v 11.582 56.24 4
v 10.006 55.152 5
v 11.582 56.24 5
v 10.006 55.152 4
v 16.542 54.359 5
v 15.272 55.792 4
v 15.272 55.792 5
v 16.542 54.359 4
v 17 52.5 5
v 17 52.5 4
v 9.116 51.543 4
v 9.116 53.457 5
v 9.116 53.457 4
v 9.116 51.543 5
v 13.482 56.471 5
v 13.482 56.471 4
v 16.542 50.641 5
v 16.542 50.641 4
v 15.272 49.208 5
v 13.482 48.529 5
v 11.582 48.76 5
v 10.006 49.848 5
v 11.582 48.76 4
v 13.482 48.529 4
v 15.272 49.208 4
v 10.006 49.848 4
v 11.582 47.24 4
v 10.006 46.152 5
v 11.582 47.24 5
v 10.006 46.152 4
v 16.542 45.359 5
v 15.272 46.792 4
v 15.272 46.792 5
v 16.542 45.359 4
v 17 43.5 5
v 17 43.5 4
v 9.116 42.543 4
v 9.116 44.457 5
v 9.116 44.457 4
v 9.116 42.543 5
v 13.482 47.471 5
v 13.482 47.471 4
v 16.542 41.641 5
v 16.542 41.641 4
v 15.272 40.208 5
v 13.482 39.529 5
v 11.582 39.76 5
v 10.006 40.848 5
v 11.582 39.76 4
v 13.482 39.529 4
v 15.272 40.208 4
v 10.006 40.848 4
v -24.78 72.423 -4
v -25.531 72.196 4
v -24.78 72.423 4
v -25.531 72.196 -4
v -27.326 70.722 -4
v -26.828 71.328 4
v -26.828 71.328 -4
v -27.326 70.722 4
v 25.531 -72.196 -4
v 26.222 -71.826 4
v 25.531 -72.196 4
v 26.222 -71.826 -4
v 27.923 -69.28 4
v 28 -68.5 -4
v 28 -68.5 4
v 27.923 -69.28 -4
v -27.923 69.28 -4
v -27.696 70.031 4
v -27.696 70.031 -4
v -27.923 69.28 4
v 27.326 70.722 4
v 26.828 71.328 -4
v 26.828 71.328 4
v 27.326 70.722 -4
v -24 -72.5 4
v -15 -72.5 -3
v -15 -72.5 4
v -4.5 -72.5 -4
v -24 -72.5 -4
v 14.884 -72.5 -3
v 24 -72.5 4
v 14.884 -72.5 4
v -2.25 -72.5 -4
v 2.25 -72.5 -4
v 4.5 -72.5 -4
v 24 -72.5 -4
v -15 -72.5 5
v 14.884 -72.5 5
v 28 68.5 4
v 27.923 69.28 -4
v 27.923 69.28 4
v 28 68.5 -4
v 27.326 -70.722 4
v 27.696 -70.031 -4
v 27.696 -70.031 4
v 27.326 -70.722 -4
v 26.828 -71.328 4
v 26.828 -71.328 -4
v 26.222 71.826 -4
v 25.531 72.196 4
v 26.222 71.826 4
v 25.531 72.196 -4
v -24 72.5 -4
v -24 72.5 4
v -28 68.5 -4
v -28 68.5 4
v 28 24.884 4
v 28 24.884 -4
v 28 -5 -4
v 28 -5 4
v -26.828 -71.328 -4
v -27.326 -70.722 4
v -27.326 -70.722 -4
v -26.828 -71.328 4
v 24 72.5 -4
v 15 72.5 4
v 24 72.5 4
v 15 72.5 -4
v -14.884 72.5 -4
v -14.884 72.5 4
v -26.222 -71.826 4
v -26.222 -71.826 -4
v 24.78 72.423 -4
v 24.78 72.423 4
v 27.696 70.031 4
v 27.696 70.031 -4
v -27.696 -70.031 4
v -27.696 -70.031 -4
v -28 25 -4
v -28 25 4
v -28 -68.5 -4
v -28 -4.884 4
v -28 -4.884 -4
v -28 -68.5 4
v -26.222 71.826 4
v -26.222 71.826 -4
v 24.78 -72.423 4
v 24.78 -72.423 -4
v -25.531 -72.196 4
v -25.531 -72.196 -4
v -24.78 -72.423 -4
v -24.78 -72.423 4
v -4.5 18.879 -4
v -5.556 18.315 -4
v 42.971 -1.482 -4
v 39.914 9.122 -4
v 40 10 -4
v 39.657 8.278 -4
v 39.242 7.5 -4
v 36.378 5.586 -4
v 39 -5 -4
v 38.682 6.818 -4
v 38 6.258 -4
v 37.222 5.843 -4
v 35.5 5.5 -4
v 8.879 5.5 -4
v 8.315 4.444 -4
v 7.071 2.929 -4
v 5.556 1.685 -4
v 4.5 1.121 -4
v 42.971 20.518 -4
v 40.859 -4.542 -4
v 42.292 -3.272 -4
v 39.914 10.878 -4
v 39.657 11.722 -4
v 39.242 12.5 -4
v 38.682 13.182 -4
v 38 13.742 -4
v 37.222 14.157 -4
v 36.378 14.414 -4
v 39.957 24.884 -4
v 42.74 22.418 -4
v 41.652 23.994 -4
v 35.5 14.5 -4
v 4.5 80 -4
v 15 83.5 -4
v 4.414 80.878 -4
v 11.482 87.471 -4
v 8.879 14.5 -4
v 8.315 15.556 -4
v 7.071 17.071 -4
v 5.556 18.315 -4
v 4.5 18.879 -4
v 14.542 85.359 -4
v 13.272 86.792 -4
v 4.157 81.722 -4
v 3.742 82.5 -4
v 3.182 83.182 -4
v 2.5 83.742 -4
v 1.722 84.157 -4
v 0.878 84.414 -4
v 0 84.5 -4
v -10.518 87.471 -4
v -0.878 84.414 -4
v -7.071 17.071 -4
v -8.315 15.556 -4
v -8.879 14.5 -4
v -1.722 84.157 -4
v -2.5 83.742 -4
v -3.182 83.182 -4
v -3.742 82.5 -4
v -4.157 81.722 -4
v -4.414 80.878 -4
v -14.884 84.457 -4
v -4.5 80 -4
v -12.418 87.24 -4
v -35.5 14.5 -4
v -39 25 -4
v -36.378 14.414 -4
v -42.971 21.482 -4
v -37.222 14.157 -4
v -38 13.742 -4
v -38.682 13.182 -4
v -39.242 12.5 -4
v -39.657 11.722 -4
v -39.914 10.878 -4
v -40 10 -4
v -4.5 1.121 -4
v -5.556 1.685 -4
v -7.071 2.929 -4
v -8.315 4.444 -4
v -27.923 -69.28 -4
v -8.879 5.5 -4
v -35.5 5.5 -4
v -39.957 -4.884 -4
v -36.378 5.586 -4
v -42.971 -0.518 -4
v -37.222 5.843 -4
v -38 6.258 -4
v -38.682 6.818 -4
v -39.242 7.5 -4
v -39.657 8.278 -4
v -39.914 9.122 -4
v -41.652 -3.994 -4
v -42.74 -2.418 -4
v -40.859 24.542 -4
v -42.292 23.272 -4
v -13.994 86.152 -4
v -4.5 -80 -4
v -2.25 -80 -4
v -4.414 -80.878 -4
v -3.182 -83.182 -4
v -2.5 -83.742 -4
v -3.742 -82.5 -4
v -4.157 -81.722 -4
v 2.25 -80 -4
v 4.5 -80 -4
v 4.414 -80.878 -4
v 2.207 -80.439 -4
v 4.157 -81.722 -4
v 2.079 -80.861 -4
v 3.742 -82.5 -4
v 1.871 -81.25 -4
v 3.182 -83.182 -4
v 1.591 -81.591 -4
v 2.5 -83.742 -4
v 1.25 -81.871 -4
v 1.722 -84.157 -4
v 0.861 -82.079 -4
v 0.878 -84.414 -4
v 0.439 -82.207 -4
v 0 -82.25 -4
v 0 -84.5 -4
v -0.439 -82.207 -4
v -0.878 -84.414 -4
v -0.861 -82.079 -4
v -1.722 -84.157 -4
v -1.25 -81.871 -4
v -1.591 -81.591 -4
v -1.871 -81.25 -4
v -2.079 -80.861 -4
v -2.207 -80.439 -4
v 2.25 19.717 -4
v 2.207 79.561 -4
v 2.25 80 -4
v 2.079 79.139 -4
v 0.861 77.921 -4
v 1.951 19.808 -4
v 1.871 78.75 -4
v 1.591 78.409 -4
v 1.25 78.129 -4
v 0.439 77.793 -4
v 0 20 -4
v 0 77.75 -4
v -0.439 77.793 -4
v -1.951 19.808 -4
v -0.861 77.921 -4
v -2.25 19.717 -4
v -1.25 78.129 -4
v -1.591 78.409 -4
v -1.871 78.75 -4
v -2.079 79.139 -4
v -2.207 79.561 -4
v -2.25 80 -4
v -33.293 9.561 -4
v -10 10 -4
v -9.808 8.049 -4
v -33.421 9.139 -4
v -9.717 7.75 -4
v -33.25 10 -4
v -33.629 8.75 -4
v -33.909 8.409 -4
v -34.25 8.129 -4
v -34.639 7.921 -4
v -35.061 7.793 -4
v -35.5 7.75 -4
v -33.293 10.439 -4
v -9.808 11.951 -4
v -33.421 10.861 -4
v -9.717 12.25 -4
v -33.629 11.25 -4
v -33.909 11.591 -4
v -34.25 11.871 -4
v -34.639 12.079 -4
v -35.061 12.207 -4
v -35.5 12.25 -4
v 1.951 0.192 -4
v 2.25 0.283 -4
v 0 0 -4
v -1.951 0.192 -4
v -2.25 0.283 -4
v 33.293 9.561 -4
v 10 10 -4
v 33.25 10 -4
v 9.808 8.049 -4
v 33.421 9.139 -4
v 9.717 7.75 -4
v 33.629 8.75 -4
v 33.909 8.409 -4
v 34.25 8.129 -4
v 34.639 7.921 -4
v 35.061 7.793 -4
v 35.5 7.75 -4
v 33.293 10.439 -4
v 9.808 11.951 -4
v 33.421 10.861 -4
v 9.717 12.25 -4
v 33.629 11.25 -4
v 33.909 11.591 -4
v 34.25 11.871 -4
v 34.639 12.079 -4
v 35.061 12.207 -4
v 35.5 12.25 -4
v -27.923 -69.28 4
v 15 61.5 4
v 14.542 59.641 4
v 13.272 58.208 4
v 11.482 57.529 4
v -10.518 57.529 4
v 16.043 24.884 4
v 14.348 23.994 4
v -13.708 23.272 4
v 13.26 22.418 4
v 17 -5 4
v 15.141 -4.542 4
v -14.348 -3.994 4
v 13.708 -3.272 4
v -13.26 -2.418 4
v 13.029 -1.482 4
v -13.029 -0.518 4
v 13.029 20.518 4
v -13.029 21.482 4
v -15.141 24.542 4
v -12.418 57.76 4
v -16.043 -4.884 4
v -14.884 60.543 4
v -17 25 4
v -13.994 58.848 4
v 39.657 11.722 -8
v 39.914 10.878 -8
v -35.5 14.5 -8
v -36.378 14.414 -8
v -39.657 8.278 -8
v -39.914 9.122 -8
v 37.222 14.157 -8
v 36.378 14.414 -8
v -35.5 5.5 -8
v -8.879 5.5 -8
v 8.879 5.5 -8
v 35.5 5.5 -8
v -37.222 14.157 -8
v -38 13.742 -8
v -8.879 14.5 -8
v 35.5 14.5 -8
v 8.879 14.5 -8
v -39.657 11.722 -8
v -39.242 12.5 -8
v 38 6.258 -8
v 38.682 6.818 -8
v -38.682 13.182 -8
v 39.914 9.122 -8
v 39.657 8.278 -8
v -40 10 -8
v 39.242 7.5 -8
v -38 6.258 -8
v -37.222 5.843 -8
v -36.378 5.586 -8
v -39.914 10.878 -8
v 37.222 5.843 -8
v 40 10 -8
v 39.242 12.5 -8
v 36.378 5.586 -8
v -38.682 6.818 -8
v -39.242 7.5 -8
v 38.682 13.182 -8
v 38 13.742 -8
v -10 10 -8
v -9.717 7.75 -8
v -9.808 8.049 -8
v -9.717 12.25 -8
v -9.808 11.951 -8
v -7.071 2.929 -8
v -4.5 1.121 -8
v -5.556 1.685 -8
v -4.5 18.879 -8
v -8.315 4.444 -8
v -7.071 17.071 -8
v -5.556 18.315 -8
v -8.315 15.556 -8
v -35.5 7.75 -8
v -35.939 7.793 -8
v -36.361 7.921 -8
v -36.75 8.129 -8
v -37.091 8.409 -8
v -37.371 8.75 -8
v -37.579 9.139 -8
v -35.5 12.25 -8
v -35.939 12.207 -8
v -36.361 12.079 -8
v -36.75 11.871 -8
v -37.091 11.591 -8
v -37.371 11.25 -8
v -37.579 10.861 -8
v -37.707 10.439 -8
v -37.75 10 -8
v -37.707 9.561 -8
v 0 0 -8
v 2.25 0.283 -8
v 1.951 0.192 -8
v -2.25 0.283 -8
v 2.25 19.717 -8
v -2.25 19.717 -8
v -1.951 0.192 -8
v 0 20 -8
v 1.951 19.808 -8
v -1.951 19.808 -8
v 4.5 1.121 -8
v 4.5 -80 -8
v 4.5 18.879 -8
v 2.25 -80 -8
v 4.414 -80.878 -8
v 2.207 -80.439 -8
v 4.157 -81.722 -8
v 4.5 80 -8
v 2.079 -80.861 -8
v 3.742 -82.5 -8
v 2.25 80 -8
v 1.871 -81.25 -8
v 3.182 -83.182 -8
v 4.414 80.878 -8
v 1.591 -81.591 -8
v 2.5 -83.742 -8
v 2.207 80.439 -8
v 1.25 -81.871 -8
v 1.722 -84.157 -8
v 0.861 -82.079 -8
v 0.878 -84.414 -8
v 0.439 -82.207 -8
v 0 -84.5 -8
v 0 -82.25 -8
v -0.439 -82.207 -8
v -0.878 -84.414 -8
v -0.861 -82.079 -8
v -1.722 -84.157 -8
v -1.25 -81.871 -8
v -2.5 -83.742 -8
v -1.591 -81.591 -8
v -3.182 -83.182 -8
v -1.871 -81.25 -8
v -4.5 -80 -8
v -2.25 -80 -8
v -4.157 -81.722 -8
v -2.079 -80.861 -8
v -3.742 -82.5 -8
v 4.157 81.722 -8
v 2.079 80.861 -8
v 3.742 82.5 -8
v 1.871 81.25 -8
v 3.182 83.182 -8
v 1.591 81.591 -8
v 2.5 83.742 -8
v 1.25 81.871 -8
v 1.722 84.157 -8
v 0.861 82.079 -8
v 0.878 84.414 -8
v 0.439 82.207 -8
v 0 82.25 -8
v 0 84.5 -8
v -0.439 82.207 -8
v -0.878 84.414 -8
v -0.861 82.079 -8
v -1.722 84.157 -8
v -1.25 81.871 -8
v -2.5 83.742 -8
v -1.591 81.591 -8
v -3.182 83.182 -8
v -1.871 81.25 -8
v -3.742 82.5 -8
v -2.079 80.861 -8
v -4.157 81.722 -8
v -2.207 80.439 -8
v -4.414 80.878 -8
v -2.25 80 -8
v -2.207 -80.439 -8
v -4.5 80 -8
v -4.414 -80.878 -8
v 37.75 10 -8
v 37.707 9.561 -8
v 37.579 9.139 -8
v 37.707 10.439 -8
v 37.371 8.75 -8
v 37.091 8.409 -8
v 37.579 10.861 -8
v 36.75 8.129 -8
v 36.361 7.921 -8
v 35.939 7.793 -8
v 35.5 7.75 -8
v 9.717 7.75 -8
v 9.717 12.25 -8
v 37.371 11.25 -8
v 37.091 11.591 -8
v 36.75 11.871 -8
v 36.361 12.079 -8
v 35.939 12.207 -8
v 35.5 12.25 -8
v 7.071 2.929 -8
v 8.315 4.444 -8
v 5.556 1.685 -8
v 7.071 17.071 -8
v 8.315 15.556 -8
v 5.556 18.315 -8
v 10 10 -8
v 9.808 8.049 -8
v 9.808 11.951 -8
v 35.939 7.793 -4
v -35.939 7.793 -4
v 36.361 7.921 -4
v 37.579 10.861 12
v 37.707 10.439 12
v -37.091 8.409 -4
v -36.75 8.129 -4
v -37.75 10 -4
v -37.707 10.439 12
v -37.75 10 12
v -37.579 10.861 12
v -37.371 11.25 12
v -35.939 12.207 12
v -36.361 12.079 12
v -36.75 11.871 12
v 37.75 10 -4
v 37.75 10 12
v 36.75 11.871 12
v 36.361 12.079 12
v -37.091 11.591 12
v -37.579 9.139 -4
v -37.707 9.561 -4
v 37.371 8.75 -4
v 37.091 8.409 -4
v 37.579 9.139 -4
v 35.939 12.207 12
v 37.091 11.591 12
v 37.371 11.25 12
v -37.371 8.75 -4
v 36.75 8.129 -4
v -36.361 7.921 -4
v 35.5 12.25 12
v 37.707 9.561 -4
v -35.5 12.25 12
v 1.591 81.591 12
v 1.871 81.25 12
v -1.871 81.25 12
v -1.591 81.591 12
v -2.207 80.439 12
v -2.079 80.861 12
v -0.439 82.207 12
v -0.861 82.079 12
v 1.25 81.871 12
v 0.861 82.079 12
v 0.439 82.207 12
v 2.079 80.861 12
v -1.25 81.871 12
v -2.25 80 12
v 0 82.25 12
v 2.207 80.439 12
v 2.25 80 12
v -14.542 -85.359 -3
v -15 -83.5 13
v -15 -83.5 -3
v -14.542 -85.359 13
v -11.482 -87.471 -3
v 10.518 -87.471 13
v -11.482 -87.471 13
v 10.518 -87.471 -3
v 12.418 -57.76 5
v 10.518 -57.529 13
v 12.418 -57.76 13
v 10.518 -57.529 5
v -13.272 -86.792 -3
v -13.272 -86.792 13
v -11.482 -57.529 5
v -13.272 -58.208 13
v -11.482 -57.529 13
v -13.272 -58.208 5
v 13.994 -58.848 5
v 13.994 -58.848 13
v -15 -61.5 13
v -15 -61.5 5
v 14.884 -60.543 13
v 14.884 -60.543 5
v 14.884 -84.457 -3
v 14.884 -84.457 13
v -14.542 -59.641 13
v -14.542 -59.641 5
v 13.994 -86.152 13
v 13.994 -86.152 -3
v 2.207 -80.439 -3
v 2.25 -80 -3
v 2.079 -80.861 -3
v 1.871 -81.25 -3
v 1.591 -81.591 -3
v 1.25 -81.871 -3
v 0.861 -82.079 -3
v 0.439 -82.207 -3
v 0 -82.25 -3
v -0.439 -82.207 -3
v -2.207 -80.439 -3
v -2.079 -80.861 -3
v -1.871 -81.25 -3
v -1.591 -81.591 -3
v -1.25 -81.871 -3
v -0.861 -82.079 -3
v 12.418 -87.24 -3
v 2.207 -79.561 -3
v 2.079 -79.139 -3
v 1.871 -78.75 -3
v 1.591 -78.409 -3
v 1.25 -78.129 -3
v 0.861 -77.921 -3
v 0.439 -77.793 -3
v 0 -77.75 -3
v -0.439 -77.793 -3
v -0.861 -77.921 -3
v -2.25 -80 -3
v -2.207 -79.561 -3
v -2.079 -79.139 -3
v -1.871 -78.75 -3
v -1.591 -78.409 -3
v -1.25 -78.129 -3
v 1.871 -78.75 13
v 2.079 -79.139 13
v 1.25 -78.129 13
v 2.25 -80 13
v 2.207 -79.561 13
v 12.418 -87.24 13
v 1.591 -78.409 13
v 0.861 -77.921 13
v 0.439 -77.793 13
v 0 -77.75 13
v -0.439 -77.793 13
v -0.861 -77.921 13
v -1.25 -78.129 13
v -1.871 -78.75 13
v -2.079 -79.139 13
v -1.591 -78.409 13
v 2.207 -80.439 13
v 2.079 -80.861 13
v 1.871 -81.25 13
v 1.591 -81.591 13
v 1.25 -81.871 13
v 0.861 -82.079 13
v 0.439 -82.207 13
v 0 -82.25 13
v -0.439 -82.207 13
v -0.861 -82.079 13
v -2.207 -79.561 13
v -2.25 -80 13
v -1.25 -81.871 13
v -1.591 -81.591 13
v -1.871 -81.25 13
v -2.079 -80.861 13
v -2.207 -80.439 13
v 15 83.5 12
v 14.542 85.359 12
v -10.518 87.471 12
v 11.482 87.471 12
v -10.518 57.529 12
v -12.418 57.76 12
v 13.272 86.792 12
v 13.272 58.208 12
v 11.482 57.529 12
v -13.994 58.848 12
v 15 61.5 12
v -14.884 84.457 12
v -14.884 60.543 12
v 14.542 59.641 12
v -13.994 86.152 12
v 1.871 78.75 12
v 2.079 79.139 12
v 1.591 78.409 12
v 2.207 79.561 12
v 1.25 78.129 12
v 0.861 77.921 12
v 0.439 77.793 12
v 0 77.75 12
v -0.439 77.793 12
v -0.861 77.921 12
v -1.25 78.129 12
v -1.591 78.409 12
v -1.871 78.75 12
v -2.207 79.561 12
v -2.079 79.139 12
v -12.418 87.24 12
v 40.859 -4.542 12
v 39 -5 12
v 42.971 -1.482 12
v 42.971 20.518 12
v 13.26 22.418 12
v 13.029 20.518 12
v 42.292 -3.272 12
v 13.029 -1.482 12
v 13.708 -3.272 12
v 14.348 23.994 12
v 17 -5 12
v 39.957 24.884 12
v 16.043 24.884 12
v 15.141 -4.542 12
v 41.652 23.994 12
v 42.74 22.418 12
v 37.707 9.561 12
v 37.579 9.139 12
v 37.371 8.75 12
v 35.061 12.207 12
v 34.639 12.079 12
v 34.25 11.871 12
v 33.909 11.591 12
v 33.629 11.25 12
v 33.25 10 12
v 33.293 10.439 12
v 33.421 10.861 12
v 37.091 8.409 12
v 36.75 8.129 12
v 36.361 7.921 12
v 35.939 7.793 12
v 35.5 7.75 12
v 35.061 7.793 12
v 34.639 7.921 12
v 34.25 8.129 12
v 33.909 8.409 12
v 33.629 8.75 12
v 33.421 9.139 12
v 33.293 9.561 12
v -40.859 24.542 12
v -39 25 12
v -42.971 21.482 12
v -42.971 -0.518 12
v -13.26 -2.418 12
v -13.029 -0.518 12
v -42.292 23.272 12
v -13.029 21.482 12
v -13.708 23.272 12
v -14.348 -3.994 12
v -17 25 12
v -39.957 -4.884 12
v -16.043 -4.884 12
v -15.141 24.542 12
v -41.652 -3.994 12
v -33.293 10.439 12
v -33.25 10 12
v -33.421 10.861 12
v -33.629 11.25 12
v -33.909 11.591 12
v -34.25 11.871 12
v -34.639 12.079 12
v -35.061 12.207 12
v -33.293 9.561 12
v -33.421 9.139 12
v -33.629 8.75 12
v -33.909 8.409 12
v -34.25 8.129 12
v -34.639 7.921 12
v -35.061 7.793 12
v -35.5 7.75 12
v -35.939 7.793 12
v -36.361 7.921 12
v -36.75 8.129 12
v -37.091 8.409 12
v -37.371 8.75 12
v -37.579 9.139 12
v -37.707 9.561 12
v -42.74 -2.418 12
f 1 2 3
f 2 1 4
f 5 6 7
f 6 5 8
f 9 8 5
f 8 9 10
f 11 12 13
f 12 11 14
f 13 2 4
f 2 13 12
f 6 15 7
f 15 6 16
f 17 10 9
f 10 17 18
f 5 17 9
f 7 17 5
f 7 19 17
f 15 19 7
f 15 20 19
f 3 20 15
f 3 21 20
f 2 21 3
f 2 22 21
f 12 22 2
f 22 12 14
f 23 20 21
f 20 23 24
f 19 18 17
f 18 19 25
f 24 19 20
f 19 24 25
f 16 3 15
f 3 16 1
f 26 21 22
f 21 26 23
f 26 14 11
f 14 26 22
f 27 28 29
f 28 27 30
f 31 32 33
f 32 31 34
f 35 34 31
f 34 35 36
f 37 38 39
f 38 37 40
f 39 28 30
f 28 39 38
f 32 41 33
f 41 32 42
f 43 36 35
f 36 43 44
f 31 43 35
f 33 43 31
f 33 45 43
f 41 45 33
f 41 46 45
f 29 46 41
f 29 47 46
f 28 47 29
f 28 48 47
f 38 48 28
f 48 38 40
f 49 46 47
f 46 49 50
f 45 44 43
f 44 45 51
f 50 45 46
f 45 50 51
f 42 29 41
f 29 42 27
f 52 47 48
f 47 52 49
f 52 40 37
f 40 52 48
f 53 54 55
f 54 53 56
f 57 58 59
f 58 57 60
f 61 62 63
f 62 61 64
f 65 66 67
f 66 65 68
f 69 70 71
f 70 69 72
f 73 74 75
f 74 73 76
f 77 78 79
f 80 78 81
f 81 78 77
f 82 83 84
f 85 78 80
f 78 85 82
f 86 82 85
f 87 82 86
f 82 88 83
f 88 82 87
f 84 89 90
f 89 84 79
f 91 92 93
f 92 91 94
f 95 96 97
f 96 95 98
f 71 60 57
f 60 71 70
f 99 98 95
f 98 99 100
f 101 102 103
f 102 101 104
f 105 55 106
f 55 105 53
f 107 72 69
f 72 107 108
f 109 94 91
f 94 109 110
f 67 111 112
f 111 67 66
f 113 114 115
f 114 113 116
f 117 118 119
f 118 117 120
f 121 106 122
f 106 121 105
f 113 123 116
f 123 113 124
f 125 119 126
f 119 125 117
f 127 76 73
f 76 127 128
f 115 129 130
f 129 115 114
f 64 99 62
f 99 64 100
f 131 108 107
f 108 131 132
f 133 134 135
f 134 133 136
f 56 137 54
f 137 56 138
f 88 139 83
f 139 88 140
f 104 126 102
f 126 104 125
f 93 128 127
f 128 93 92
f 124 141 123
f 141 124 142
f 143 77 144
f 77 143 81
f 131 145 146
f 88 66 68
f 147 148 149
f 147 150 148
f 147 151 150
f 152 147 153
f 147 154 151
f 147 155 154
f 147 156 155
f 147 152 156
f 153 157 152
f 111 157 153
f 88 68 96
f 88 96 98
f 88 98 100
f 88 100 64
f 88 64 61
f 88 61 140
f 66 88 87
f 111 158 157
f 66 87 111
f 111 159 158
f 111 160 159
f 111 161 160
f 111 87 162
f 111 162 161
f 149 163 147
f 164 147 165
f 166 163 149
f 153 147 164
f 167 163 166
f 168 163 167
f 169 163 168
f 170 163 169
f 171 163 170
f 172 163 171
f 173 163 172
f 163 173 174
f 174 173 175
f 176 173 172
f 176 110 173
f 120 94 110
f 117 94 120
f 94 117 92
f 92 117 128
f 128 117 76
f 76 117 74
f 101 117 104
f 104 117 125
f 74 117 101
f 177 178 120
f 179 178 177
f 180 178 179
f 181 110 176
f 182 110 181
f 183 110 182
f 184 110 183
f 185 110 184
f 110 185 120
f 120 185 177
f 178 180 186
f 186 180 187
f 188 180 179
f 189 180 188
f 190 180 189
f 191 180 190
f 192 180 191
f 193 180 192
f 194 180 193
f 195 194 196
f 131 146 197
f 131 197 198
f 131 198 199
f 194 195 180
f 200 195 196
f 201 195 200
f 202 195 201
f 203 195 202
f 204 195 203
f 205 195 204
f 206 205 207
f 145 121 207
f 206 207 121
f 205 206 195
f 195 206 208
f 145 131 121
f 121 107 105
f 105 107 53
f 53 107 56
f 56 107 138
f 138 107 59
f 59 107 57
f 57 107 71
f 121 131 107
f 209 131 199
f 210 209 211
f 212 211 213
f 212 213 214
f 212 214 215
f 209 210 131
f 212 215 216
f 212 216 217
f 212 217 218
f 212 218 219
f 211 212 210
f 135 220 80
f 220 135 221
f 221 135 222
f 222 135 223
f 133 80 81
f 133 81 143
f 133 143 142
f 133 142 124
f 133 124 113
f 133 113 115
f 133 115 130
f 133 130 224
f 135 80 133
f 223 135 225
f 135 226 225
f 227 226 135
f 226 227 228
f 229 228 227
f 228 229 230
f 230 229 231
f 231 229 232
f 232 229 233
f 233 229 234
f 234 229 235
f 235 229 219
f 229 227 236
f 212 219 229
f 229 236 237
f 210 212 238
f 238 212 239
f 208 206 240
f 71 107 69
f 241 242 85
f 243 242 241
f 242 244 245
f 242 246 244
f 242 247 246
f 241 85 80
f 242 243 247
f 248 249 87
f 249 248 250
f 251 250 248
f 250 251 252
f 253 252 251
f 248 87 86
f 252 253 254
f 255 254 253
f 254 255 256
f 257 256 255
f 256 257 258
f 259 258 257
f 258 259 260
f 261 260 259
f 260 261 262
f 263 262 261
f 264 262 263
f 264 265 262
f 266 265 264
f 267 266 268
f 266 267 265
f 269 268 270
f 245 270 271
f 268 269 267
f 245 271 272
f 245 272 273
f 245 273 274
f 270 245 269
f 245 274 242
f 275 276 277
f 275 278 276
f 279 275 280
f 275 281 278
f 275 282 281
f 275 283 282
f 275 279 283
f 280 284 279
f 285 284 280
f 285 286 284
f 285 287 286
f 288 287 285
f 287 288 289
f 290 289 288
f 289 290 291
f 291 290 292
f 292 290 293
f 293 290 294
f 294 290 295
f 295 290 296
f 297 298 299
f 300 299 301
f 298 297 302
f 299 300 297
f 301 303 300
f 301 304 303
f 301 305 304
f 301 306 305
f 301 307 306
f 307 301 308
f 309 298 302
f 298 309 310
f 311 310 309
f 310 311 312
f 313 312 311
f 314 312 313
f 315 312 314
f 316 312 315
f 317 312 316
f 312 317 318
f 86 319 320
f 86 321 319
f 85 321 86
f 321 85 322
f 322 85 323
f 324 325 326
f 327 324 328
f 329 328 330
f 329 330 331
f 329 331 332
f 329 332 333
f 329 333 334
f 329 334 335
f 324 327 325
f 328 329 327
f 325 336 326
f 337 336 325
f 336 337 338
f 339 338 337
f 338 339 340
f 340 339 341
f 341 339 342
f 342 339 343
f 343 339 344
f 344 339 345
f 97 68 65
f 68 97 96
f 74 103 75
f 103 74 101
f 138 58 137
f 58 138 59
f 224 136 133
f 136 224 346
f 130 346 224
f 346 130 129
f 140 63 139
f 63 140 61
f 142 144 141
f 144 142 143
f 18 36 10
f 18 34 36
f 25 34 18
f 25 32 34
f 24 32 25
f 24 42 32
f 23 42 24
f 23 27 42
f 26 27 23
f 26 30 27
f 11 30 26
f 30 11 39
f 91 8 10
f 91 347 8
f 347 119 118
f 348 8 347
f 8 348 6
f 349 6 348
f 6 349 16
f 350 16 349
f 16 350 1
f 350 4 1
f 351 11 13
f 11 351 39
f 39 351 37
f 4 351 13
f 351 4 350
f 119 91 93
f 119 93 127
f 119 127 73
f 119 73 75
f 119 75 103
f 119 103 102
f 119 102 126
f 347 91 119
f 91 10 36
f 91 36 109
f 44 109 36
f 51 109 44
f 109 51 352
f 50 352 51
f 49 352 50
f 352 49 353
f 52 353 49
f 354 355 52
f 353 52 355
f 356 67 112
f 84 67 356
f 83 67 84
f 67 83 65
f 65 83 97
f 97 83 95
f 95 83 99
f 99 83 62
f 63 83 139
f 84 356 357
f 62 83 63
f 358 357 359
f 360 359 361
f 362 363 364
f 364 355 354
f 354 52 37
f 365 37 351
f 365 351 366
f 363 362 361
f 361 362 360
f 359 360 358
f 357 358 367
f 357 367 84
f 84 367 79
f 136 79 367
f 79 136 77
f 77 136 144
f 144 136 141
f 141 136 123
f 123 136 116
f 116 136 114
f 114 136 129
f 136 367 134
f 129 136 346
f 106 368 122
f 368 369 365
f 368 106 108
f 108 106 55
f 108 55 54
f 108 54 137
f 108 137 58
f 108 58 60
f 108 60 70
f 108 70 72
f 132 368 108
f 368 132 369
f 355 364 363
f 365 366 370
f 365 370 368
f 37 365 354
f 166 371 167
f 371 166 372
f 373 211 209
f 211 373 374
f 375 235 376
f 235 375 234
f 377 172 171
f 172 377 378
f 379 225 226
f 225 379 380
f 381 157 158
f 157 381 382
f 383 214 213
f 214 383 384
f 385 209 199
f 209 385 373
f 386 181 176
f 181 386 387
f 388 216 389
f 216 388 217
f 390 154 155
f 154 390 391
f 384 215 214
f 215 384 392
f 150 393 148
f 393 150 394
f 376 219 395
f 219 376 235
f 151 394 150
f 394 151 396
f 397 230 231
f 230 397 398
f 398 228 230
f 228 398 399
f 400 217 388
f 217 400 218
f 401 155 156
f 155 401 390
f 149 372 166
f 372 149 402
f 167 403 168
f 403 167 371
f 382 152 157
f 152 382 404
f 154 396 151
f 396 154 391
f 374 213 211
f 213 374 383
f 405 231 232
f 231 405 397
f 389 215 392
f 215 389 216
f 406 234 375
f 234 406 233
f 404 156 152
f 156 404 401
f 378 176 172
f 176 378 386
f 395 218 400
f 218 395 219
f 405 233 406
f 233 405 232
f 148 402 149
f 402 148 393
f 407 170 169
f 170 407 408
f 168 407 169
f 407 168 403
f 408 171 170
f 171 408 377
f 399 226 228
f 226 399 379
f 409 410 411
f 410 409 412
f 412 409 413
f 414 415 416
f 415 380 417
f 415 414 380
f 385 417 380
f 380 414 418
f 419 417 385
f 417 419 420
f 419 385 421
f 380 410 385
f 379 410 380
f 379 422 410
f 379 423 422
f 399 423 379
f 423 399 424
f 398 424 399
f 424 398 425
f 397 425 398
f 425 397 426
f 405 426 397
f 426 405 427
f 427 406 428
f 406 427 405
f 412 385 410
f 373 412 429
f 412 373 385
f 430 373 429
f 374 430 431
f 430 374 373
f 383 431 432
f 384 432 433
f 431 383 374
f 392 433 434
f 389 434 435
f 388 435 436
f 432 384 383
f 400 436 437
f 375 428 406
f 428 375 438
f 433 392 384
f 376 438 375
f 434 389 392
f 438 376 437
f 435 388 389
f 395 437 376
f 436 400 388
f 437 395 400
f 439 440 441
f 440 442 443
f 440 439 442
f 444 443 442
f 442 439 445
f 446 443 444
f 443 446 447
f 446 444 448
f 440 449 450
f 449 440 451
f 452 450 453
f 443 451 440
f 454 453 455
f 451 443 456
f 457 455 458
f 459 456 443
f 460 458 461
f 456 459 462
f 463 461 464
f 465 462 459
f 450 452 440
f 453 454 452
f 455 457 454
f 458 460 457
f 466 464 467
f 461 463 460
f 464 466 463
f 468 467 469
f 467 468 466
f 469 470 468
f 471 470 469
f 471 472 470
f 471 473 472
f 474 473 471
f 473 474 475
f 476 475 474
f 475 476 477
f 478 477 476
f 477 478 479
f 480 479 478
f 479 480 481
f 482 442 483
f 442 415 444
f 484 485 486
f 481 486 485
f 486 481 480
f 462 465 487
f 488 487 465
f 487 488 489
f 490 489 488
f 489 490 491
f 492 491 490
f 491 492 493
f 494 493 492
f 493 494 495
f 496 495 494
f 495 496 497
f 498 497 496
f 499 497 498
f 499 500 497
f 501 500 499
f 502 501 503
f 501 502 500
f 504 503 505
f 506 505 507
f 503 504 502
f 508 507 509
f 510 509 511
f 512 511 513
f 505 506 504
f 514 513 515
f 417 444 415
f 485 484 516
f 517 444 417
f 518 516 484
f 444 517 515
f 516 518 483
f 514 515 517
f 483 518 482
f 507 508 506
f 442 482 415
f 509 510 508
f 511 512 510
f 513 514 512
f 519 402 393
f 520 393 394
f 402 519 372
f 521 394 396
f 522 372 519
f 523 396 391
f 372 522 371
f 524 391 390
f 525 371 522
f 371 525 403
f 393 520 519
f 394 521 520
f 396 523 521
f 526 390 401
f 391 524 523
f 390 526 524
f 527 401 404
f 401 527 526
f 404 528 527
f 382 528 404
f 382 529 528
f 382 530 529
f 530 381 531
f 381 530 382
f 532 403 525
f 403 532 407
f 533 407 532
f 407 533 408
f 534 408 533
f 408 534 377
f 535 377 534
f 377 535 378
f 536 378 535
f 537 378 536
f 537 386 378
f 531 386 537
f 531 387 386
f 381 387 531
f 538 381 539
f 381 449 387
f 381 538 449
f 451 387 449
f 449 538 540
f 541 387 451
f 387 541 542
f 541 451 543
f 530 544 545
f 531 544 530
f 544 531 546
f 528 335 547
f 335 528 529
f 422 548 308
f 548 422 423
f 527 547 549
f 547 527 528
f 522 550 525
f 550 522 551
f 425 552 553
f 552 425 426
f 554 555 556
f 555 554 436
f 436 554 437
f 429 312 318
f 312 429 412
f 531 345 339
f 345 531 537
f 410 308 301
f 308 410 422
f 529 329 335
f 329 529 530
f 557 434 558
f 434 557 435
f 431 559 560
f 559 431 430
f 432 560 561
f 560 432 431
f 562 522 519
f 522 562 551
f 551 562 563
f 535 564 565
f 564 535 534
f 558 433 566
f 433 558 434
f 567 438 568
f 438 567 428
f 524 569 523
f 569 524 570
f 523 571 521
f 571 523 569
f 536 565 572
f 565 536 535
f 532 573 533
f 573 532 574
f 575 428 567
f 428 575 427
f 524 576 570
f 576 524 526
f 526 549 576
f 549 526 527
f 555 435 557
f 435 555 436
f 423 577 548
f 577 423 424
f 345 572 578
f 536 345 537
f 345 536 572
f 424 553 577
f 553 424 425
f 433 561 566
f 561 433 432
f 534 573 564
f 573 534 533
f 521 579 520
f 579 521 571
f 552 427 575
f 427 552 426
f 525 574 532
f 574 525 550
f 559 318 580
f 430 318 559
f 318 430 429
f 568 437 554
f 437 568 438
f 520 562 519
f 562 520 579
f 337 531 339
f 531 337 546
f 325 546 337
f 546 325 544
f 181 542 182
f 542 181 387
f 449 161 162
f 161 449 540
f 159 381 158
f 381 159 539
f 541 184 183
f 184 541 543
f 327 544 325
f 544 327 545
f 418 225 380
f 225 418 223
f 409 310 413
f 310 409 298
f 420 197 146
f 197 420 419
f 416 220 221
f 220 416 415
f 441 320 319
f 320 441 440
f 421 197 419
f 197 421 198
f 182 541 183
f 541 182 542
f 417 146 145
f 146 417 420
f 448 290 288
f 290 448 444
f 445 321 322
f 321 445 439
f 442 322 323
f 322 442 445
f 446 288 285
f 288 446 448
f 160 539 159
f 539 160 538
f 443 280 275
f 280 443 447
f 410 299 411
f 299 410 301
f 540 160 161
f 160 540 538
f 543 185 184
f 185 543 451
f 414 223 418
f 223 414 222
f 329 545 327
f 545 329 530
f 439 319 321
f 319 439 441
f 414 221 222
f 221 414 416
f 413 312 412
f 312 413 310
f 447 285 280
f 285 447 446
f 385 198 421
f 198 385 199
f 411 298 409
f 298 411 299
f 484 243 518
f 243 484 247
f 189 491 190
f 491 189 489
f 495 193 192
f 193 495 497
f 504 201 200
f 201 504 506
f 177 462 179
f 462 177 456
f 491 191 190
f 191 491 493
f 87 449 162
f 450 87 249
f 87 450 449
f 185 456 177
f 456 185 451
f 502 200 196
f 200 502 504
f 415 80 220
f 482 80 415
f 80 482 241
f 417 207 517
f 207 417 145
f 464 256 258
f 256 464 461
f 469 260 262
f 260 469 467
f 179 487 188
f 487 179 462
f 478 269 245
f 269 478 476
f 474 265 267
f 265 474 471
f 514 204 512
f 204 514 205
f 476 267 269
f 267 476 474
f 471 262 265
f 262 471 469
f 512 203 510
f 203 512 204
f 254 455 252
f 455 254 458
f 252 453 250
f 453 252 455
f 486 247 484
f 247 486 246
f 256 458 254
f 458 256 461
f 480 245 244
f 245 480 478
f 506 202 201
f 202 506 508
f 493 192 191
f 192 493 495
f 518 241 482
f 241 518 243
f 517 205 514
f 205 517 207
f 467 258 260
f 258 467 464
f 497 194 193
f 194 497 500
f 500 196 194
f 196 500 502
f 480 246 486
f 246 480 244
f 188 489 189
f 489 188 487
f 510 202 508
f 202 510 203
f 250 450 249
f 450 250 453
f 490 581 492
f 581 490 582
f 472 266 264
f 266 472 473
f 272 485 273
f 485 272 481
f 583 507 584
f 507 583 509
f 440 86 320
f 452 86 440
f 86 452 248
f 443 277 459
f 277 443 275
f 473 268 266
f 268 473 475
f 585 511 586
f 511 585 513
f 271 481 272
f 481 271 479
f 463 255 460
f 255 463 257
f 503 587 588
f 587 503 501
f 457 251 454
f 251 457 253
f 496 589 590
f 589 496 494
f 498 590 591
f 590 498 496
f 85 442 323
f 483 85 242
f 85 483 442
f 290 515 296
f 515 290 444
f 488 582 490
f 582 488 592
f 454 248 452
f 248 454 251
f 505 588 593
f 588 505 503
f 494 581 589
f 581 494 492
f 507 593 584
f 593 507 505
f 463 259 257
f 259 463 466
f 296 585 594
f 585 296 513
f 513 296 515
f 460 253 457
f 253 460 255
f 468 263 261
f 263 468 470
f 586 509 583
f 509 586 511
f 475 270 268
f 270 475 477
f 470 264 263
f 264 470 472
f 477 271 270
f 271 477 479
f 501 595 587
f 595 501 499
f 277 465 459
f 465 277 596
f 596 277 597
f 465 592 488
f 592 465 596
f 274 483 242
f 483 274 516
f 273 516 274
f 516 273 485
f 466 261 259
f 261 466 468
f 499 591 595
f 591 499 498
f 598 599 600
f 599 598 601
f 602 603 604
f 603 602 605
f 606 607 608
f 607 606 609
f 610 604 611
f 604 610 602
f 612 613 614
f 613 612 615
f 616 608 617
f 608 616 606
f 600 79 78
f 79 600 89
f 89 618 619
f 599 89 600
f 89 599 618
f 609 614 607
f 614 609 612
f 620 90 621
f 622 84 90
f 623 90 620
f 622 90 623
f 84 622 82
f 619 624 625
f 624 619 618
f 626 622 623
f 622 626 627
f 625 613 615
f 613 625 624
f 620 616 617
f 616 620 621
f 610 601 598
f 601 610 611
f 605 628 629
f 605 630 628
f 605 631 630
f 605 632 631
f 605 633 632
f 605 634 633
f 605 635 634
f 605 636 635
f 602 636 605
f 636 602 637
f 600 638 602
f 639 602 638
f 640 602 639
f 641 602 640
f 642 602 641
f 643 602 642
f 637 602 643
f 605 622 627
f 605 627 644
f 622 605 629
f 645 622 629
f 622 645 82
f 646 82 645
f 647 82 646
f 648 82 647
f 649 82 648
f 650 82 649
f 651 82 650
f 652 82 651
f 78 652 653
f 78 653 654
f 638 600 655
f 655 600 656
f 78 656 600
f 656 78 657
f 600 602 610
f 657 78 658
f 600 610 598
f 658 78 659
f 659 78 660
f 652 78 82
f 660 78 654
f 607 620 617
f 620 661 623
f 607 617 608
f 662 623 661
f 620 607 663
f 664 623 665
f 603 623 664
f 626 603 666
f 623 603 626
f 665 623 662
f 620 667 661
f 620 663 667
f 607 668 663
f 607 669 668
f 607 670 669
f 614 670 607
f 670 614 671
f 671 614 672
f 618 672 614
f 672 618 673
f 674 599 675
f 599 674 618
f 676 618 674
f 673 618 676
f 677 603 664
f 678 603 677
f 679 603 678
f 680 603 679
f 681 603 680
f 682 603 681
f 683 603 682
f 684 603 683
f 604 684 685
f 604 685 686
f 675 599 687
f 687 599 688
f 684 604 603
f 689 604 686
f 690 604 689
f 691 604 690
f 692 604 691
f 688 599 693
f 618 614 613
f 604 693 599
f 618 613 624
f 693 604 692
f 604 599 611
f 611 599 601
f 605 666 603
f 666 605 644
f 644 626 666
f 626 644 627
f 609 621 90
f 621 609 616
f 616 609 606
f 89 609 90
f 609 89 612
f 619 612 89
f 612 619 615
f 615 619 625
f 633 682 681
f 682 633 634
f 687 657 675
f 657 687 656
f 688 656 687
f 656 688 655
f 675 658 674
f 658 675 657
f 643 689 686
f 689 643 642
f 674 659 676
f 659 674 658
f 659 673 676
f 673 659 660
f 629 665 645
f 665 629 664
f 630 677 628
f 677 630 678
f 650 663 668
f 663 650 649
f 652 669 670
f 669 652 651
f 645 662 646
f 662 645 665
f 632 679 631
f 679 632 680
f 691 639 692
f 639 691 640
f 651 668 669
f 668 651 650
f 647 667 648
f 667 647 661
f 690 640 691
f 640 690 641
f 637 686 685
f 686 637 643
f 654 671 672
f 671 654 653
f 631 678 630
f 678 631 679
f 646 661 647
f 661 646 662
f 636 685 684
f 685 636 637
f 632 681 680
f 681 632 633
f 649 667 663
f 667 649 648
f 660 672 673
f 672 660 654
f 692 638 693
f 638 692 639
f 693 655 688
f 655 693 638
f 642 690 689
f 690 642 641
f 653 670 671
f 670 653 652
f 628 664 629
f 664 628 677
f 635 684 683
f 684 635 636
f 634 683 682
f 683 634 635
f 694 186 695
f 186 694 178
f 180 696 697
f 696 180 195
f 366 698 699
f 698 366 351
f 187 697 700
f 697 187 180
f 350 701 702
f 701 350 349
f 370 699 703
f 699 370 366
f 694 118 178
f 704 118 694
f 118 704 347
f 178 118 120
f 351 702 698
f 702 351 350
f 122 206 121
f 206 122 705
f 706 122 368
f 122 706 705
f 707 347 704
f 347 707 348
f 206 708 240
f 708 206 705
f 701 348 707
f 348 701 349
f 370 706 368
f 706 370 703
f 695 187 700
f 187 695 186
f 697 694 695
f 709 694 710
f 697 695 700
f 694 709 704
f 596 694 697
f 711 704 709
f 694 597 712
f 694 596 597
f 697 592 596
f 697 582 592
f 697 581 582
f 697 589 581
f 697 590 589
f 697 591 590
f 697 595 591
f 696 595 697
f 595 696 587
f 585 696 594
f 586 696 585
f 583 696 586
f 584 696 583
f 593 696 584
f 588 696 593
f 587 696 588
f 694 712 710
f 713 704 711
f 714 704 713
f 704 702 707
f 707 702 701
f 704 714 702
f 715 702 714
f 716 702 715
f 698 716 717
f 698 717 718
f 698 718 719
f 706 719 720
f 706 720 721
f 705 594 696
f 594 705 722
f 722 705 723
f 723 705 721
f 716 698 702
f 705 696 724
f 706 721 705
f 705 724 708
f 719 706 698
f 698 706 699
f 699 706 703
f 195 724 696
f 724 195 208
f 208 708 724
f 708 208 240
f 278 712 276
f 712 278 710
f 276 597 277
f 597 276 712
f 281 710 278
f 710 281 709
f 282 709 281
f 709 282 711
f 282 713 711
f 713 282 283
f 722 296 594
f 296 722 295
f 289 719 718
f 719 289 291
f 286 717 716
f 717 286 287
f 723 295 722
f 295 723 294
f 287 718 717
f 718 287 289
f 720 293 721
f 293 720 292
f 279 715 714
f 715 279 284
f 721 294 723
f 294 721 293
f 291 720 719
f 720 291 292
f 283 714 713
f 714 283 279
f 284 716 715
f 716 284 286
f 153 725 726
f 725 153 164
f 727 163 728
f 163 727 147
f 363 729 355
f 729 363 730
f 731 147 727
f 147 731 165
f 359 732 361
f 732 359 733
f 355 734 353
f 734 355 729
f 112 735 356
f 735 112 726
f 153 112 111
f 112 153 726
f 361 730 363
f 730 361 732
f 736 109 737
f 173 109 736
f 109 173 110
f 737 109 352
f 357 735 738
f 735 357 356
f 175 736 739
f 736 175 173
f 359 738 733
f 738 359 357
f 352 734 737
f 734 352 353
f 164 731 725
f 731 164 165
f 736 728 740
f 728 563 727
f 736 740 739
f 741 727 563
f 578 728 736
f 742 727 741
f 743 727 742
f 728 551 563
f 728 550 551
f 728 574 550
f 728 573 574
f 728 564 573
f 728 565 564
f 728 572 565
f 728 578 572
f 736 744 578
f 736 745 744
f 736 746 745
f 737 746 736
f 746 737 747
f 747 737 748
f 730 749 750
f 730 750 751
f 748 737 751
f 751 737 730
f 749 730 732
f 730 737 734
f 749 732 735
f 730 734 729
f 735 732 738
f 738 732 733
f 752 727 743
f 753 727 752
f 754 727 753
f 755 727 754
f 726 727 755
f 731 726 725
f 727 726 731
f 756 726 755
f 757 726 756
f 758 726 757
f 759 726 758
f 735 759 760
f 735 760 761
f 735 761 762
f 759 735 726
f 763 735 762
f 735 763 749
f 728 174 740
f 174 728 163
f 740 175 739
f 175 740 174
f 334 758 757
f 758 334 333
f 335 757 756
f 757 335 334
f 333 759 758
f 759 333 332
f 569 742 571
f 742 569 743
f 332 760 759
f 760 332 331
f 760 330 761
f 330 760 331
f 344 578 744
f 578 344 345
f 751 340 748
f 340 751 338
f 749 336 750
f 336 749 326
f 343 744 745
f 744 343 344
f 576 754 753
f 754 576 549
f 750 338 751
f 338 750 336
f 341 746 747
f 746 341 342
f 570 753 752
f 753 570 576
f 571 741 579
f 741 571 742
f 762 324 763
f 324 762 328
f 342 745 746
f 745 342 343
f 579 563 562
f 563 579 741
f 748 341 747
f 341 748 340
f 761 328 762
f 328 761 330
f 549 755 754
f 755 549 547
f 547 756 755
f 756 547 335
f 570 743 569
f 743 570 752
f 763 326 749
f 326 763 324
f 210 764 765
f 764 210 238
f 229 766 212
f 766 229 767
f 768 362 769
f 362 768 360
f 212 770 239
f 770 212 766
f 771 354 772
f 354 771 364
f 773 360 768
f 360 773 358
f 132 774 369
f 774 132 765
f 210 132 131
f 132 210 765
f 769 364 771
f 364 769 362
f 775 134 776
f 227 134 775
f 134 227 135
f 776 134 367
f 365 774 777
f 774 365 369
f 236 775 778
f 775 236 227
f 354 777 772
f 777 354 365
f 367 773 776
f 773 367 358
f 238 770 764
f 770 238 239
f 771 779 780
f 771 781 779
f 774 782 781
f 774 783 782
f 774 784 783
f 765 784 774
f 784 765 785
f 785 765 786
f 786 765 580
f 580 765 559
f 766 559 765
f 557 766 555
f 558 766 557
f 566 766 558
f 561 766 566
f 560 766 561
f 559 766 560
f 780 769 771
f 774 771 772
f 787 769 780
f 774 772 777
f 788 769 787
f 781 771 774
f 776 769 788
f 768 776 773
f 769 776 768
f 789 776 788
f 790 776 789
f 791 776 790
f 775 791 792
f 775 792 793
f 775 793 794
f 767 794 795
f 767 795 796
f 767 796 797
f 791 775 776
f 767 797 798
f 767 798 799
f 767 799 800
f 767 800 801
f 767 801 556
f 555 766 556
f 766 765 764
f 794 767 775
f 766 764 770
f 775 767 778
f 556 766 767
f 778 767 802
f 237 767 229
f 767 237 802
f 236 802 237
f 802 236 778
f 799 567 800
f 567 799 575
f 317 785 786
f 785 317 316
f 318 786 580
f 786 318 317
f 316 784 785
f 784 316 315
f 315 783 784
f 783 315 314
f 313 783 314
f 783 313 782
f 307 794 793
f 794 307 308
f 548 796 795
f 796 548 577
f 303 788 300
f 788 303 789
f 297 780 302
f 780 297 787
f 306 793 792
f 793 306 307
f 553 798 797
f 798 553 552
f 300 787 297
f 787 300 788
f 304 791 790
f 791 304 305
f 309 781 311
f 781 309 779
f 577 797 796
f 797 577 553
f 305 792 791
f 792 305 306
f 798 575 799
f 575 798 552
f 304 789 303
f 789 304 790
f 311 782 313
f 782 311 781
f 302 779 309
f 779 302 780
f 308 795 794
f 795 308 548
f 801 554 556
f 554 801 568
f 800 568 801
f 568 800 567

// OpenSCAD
// file: holder.scad
len_phone = 145;
width_phone = 56;
thickness_phone = 8;
corner_round = 8;

d_screw_m4 = 4.5;
thickness_holder = 4;
append = 15;
w_grip = 30;

//holder_base();
//holder_set();
// horizontal_block(20);
// vertical_block(len_phone);
//grip();
test_print_holder();

module test_print_holder() {
translate([0, -20, 6])
grip();
horizontal_block(len_block=width_phone, offset_vertical=10);
}

module grip(){
        difference(){
        grip_base();

        color("red")
        translate([0, w_grip/2, thickness_phone])
        cube([w_grip+1, w_grip, 2*thickness_phone], center=true);
        
        translate ([0, -w_grip/4, 0])
        cylinder(d=d_screw_m4, 3*thickness_phone, center=true, $fn=32);
    }
}

module grip_base() {
    hull() {
        translate([w_grip/2-corner_round/2, -w_grip/2+corner_round/2, 0])
        cylinder(d=corner_round, 2*thickness_phone, center=true);
        translate([-w_grip/2+corner_round/2, -w_grip/2+corner_round/2, 0])
        cylinder(d=corner_round, 2*thickness_phone, center=true);
        translate([w_grip/2-corner_round/2, w_grip/2-corner_round/2, 0])
        cylinder(d=corner_round, 2*thickness_phone, center=true);
        translate([-w_grip/2+corner_round/2, w_grip/2-corner_round/2, 0])
        cylinder(d=corner_round, 2*thickness_phone, center=true);
    }
}

module holder_set() {
    
    holder_base();
    
    translate([0, -len_phone/2, thickness_phone+thickness_holder/2+1])
    rotate([0, 180, 0])
    grip();
    
    translate([0, len_phone/2, thickness_phone+thickness_holder/2])
    rotate([0, 180, 180])
    grip();
    
    translate([width_phone/2, 10, thickness_phone+thickness_holder/2])
    rotate([0, 180, 90])
    grip();
    
    translate([-width_phone/2, 10, thickness_phone+thickness_holder/2])
    rotate([0, 180, -90])
    grip();
    
}

module holder_base() {
    horizontal_block(len_block=width_phone, offset_vertical=10);
    vertical_block(len_block=len_phone);
    }

module vertical_block(len_block) {
    len_block = len_block + append;
    difference() {

        hull() {
            //translate([0, -len_phone/2, 0])
            translate([0, -len_block/2, 0])
                cylinder(d=9, h=thickness_holder, center=true, $fn=32);

            //translate([0, len_phone/2, 0])
            translate([0, len_block/2, 0])
                cylinder(d=9, h=thickness_holder, center=true, $fn=32);
        }
        color("red")
        hull() {
            // translate([0, -len_phone/2, 0])
            translate([0, -len_block/2, 0])
                cylinder(d=d_screw_m4, h=thickness_holder+2, center=true, $fn=32);

            // translate([0, len_phone/2, 0])
            translate([0, len_block/2, 0])
                cylinder(d=d_screw_m4, h=thickness_holder+2, center=true, $fn=32);
        }
    }
}

module horizontal_block(len_block, offset_vertical) {
    len_block = len_block + append;
    translate([0, offset_vertical, 0])
    cylinder(d=20, h=thickness_holder, center=true, $fn=32);

    difference() {
        hull() {
            translate([len_block/2, offset_vertical, 0])
                cylinder(d=9, h=thickness_holder, center=true, $fn=32);

            translate([-len_block/2, offset_vertical, 0])
                cylinder(d=9, h=thickness_holder, center=true, $fn=32);
        }
        color("red")
        hull() {
            translate([len_block/2, offset_vertical,, 0])
                cylinder(d=d_screw_m4, h=thickness_holder+2, center=true, $fn=32);

            translate([-len_block/2, offset_vertical,, 0])
                cylinder(d=d_screw_m4, h=thickness_holder+2, center=true, $fn=32);
        }
    }
}
// file: smartphone.scad
echo("Работа Павла Поздеева");
len_phone = 145;
width_phone = 56;
thickness_phone = 8;
corner_round = 8;

//color("red")
//translate([0, 0, 10])
//cube([width_phone, len_phone, thickness_phone], center=true);

smartphone();

module smartphone() {
    smartphone_block();
    cameras_block();
}

module cameras_block() {
    color("blue")
    translate([width_phone/2 - 15, len_phone/2 - 20, 0])
        cylinder(d=8, h = thickness_phone/2 + 1);

    color("blue")
    translate([width_phone/2 - 15, len_phone/2 - 29, 0])
        cylinder(d=8, h = thickness_phone/2 + 1);
}

module smartphone_block() {
    hull() {
        translate([width_phone/2 - corner_round/2, len_phone/2 - corner_round/2, 0])
            cylinder(h=thickness_phone, d=corner_round, $fn=32, center=true);

        mirror([1, 0, 0])
        translate([width_phone/2 - corner_round/2, len_phone/2 - corner_round/2, 0])
            cylinder(h=thickness_phone, d=corner_round, $fn=32, center=true);

        mirror([0, 1, 0])
        translate([width_phone/2 - corner_round/2, len_phone/2 - corner_round/2, 0])
            cylinder(h=thickness_phone, d=corner_round, $fn=32, center=true);

        mirror([1, 0, 0])
        mirror([0, 1, 0])
        translate([width_phone/2 - corner_round/2, len_phone/2 - corner_round/2, 0])
            cylinder(h=thickness_phone, d=corner_round, $fn=32, center=true);
    }
}
// main file
use <smartphone.scad>
use <holder.scad>

thickness_phone = 8;
thickness_holder = 4;

echo("Работа Павла Поздеева");
smartphone();
translate([0, 0, -thickness_phone/2 - thickness_holder/2])
    holder_set();
